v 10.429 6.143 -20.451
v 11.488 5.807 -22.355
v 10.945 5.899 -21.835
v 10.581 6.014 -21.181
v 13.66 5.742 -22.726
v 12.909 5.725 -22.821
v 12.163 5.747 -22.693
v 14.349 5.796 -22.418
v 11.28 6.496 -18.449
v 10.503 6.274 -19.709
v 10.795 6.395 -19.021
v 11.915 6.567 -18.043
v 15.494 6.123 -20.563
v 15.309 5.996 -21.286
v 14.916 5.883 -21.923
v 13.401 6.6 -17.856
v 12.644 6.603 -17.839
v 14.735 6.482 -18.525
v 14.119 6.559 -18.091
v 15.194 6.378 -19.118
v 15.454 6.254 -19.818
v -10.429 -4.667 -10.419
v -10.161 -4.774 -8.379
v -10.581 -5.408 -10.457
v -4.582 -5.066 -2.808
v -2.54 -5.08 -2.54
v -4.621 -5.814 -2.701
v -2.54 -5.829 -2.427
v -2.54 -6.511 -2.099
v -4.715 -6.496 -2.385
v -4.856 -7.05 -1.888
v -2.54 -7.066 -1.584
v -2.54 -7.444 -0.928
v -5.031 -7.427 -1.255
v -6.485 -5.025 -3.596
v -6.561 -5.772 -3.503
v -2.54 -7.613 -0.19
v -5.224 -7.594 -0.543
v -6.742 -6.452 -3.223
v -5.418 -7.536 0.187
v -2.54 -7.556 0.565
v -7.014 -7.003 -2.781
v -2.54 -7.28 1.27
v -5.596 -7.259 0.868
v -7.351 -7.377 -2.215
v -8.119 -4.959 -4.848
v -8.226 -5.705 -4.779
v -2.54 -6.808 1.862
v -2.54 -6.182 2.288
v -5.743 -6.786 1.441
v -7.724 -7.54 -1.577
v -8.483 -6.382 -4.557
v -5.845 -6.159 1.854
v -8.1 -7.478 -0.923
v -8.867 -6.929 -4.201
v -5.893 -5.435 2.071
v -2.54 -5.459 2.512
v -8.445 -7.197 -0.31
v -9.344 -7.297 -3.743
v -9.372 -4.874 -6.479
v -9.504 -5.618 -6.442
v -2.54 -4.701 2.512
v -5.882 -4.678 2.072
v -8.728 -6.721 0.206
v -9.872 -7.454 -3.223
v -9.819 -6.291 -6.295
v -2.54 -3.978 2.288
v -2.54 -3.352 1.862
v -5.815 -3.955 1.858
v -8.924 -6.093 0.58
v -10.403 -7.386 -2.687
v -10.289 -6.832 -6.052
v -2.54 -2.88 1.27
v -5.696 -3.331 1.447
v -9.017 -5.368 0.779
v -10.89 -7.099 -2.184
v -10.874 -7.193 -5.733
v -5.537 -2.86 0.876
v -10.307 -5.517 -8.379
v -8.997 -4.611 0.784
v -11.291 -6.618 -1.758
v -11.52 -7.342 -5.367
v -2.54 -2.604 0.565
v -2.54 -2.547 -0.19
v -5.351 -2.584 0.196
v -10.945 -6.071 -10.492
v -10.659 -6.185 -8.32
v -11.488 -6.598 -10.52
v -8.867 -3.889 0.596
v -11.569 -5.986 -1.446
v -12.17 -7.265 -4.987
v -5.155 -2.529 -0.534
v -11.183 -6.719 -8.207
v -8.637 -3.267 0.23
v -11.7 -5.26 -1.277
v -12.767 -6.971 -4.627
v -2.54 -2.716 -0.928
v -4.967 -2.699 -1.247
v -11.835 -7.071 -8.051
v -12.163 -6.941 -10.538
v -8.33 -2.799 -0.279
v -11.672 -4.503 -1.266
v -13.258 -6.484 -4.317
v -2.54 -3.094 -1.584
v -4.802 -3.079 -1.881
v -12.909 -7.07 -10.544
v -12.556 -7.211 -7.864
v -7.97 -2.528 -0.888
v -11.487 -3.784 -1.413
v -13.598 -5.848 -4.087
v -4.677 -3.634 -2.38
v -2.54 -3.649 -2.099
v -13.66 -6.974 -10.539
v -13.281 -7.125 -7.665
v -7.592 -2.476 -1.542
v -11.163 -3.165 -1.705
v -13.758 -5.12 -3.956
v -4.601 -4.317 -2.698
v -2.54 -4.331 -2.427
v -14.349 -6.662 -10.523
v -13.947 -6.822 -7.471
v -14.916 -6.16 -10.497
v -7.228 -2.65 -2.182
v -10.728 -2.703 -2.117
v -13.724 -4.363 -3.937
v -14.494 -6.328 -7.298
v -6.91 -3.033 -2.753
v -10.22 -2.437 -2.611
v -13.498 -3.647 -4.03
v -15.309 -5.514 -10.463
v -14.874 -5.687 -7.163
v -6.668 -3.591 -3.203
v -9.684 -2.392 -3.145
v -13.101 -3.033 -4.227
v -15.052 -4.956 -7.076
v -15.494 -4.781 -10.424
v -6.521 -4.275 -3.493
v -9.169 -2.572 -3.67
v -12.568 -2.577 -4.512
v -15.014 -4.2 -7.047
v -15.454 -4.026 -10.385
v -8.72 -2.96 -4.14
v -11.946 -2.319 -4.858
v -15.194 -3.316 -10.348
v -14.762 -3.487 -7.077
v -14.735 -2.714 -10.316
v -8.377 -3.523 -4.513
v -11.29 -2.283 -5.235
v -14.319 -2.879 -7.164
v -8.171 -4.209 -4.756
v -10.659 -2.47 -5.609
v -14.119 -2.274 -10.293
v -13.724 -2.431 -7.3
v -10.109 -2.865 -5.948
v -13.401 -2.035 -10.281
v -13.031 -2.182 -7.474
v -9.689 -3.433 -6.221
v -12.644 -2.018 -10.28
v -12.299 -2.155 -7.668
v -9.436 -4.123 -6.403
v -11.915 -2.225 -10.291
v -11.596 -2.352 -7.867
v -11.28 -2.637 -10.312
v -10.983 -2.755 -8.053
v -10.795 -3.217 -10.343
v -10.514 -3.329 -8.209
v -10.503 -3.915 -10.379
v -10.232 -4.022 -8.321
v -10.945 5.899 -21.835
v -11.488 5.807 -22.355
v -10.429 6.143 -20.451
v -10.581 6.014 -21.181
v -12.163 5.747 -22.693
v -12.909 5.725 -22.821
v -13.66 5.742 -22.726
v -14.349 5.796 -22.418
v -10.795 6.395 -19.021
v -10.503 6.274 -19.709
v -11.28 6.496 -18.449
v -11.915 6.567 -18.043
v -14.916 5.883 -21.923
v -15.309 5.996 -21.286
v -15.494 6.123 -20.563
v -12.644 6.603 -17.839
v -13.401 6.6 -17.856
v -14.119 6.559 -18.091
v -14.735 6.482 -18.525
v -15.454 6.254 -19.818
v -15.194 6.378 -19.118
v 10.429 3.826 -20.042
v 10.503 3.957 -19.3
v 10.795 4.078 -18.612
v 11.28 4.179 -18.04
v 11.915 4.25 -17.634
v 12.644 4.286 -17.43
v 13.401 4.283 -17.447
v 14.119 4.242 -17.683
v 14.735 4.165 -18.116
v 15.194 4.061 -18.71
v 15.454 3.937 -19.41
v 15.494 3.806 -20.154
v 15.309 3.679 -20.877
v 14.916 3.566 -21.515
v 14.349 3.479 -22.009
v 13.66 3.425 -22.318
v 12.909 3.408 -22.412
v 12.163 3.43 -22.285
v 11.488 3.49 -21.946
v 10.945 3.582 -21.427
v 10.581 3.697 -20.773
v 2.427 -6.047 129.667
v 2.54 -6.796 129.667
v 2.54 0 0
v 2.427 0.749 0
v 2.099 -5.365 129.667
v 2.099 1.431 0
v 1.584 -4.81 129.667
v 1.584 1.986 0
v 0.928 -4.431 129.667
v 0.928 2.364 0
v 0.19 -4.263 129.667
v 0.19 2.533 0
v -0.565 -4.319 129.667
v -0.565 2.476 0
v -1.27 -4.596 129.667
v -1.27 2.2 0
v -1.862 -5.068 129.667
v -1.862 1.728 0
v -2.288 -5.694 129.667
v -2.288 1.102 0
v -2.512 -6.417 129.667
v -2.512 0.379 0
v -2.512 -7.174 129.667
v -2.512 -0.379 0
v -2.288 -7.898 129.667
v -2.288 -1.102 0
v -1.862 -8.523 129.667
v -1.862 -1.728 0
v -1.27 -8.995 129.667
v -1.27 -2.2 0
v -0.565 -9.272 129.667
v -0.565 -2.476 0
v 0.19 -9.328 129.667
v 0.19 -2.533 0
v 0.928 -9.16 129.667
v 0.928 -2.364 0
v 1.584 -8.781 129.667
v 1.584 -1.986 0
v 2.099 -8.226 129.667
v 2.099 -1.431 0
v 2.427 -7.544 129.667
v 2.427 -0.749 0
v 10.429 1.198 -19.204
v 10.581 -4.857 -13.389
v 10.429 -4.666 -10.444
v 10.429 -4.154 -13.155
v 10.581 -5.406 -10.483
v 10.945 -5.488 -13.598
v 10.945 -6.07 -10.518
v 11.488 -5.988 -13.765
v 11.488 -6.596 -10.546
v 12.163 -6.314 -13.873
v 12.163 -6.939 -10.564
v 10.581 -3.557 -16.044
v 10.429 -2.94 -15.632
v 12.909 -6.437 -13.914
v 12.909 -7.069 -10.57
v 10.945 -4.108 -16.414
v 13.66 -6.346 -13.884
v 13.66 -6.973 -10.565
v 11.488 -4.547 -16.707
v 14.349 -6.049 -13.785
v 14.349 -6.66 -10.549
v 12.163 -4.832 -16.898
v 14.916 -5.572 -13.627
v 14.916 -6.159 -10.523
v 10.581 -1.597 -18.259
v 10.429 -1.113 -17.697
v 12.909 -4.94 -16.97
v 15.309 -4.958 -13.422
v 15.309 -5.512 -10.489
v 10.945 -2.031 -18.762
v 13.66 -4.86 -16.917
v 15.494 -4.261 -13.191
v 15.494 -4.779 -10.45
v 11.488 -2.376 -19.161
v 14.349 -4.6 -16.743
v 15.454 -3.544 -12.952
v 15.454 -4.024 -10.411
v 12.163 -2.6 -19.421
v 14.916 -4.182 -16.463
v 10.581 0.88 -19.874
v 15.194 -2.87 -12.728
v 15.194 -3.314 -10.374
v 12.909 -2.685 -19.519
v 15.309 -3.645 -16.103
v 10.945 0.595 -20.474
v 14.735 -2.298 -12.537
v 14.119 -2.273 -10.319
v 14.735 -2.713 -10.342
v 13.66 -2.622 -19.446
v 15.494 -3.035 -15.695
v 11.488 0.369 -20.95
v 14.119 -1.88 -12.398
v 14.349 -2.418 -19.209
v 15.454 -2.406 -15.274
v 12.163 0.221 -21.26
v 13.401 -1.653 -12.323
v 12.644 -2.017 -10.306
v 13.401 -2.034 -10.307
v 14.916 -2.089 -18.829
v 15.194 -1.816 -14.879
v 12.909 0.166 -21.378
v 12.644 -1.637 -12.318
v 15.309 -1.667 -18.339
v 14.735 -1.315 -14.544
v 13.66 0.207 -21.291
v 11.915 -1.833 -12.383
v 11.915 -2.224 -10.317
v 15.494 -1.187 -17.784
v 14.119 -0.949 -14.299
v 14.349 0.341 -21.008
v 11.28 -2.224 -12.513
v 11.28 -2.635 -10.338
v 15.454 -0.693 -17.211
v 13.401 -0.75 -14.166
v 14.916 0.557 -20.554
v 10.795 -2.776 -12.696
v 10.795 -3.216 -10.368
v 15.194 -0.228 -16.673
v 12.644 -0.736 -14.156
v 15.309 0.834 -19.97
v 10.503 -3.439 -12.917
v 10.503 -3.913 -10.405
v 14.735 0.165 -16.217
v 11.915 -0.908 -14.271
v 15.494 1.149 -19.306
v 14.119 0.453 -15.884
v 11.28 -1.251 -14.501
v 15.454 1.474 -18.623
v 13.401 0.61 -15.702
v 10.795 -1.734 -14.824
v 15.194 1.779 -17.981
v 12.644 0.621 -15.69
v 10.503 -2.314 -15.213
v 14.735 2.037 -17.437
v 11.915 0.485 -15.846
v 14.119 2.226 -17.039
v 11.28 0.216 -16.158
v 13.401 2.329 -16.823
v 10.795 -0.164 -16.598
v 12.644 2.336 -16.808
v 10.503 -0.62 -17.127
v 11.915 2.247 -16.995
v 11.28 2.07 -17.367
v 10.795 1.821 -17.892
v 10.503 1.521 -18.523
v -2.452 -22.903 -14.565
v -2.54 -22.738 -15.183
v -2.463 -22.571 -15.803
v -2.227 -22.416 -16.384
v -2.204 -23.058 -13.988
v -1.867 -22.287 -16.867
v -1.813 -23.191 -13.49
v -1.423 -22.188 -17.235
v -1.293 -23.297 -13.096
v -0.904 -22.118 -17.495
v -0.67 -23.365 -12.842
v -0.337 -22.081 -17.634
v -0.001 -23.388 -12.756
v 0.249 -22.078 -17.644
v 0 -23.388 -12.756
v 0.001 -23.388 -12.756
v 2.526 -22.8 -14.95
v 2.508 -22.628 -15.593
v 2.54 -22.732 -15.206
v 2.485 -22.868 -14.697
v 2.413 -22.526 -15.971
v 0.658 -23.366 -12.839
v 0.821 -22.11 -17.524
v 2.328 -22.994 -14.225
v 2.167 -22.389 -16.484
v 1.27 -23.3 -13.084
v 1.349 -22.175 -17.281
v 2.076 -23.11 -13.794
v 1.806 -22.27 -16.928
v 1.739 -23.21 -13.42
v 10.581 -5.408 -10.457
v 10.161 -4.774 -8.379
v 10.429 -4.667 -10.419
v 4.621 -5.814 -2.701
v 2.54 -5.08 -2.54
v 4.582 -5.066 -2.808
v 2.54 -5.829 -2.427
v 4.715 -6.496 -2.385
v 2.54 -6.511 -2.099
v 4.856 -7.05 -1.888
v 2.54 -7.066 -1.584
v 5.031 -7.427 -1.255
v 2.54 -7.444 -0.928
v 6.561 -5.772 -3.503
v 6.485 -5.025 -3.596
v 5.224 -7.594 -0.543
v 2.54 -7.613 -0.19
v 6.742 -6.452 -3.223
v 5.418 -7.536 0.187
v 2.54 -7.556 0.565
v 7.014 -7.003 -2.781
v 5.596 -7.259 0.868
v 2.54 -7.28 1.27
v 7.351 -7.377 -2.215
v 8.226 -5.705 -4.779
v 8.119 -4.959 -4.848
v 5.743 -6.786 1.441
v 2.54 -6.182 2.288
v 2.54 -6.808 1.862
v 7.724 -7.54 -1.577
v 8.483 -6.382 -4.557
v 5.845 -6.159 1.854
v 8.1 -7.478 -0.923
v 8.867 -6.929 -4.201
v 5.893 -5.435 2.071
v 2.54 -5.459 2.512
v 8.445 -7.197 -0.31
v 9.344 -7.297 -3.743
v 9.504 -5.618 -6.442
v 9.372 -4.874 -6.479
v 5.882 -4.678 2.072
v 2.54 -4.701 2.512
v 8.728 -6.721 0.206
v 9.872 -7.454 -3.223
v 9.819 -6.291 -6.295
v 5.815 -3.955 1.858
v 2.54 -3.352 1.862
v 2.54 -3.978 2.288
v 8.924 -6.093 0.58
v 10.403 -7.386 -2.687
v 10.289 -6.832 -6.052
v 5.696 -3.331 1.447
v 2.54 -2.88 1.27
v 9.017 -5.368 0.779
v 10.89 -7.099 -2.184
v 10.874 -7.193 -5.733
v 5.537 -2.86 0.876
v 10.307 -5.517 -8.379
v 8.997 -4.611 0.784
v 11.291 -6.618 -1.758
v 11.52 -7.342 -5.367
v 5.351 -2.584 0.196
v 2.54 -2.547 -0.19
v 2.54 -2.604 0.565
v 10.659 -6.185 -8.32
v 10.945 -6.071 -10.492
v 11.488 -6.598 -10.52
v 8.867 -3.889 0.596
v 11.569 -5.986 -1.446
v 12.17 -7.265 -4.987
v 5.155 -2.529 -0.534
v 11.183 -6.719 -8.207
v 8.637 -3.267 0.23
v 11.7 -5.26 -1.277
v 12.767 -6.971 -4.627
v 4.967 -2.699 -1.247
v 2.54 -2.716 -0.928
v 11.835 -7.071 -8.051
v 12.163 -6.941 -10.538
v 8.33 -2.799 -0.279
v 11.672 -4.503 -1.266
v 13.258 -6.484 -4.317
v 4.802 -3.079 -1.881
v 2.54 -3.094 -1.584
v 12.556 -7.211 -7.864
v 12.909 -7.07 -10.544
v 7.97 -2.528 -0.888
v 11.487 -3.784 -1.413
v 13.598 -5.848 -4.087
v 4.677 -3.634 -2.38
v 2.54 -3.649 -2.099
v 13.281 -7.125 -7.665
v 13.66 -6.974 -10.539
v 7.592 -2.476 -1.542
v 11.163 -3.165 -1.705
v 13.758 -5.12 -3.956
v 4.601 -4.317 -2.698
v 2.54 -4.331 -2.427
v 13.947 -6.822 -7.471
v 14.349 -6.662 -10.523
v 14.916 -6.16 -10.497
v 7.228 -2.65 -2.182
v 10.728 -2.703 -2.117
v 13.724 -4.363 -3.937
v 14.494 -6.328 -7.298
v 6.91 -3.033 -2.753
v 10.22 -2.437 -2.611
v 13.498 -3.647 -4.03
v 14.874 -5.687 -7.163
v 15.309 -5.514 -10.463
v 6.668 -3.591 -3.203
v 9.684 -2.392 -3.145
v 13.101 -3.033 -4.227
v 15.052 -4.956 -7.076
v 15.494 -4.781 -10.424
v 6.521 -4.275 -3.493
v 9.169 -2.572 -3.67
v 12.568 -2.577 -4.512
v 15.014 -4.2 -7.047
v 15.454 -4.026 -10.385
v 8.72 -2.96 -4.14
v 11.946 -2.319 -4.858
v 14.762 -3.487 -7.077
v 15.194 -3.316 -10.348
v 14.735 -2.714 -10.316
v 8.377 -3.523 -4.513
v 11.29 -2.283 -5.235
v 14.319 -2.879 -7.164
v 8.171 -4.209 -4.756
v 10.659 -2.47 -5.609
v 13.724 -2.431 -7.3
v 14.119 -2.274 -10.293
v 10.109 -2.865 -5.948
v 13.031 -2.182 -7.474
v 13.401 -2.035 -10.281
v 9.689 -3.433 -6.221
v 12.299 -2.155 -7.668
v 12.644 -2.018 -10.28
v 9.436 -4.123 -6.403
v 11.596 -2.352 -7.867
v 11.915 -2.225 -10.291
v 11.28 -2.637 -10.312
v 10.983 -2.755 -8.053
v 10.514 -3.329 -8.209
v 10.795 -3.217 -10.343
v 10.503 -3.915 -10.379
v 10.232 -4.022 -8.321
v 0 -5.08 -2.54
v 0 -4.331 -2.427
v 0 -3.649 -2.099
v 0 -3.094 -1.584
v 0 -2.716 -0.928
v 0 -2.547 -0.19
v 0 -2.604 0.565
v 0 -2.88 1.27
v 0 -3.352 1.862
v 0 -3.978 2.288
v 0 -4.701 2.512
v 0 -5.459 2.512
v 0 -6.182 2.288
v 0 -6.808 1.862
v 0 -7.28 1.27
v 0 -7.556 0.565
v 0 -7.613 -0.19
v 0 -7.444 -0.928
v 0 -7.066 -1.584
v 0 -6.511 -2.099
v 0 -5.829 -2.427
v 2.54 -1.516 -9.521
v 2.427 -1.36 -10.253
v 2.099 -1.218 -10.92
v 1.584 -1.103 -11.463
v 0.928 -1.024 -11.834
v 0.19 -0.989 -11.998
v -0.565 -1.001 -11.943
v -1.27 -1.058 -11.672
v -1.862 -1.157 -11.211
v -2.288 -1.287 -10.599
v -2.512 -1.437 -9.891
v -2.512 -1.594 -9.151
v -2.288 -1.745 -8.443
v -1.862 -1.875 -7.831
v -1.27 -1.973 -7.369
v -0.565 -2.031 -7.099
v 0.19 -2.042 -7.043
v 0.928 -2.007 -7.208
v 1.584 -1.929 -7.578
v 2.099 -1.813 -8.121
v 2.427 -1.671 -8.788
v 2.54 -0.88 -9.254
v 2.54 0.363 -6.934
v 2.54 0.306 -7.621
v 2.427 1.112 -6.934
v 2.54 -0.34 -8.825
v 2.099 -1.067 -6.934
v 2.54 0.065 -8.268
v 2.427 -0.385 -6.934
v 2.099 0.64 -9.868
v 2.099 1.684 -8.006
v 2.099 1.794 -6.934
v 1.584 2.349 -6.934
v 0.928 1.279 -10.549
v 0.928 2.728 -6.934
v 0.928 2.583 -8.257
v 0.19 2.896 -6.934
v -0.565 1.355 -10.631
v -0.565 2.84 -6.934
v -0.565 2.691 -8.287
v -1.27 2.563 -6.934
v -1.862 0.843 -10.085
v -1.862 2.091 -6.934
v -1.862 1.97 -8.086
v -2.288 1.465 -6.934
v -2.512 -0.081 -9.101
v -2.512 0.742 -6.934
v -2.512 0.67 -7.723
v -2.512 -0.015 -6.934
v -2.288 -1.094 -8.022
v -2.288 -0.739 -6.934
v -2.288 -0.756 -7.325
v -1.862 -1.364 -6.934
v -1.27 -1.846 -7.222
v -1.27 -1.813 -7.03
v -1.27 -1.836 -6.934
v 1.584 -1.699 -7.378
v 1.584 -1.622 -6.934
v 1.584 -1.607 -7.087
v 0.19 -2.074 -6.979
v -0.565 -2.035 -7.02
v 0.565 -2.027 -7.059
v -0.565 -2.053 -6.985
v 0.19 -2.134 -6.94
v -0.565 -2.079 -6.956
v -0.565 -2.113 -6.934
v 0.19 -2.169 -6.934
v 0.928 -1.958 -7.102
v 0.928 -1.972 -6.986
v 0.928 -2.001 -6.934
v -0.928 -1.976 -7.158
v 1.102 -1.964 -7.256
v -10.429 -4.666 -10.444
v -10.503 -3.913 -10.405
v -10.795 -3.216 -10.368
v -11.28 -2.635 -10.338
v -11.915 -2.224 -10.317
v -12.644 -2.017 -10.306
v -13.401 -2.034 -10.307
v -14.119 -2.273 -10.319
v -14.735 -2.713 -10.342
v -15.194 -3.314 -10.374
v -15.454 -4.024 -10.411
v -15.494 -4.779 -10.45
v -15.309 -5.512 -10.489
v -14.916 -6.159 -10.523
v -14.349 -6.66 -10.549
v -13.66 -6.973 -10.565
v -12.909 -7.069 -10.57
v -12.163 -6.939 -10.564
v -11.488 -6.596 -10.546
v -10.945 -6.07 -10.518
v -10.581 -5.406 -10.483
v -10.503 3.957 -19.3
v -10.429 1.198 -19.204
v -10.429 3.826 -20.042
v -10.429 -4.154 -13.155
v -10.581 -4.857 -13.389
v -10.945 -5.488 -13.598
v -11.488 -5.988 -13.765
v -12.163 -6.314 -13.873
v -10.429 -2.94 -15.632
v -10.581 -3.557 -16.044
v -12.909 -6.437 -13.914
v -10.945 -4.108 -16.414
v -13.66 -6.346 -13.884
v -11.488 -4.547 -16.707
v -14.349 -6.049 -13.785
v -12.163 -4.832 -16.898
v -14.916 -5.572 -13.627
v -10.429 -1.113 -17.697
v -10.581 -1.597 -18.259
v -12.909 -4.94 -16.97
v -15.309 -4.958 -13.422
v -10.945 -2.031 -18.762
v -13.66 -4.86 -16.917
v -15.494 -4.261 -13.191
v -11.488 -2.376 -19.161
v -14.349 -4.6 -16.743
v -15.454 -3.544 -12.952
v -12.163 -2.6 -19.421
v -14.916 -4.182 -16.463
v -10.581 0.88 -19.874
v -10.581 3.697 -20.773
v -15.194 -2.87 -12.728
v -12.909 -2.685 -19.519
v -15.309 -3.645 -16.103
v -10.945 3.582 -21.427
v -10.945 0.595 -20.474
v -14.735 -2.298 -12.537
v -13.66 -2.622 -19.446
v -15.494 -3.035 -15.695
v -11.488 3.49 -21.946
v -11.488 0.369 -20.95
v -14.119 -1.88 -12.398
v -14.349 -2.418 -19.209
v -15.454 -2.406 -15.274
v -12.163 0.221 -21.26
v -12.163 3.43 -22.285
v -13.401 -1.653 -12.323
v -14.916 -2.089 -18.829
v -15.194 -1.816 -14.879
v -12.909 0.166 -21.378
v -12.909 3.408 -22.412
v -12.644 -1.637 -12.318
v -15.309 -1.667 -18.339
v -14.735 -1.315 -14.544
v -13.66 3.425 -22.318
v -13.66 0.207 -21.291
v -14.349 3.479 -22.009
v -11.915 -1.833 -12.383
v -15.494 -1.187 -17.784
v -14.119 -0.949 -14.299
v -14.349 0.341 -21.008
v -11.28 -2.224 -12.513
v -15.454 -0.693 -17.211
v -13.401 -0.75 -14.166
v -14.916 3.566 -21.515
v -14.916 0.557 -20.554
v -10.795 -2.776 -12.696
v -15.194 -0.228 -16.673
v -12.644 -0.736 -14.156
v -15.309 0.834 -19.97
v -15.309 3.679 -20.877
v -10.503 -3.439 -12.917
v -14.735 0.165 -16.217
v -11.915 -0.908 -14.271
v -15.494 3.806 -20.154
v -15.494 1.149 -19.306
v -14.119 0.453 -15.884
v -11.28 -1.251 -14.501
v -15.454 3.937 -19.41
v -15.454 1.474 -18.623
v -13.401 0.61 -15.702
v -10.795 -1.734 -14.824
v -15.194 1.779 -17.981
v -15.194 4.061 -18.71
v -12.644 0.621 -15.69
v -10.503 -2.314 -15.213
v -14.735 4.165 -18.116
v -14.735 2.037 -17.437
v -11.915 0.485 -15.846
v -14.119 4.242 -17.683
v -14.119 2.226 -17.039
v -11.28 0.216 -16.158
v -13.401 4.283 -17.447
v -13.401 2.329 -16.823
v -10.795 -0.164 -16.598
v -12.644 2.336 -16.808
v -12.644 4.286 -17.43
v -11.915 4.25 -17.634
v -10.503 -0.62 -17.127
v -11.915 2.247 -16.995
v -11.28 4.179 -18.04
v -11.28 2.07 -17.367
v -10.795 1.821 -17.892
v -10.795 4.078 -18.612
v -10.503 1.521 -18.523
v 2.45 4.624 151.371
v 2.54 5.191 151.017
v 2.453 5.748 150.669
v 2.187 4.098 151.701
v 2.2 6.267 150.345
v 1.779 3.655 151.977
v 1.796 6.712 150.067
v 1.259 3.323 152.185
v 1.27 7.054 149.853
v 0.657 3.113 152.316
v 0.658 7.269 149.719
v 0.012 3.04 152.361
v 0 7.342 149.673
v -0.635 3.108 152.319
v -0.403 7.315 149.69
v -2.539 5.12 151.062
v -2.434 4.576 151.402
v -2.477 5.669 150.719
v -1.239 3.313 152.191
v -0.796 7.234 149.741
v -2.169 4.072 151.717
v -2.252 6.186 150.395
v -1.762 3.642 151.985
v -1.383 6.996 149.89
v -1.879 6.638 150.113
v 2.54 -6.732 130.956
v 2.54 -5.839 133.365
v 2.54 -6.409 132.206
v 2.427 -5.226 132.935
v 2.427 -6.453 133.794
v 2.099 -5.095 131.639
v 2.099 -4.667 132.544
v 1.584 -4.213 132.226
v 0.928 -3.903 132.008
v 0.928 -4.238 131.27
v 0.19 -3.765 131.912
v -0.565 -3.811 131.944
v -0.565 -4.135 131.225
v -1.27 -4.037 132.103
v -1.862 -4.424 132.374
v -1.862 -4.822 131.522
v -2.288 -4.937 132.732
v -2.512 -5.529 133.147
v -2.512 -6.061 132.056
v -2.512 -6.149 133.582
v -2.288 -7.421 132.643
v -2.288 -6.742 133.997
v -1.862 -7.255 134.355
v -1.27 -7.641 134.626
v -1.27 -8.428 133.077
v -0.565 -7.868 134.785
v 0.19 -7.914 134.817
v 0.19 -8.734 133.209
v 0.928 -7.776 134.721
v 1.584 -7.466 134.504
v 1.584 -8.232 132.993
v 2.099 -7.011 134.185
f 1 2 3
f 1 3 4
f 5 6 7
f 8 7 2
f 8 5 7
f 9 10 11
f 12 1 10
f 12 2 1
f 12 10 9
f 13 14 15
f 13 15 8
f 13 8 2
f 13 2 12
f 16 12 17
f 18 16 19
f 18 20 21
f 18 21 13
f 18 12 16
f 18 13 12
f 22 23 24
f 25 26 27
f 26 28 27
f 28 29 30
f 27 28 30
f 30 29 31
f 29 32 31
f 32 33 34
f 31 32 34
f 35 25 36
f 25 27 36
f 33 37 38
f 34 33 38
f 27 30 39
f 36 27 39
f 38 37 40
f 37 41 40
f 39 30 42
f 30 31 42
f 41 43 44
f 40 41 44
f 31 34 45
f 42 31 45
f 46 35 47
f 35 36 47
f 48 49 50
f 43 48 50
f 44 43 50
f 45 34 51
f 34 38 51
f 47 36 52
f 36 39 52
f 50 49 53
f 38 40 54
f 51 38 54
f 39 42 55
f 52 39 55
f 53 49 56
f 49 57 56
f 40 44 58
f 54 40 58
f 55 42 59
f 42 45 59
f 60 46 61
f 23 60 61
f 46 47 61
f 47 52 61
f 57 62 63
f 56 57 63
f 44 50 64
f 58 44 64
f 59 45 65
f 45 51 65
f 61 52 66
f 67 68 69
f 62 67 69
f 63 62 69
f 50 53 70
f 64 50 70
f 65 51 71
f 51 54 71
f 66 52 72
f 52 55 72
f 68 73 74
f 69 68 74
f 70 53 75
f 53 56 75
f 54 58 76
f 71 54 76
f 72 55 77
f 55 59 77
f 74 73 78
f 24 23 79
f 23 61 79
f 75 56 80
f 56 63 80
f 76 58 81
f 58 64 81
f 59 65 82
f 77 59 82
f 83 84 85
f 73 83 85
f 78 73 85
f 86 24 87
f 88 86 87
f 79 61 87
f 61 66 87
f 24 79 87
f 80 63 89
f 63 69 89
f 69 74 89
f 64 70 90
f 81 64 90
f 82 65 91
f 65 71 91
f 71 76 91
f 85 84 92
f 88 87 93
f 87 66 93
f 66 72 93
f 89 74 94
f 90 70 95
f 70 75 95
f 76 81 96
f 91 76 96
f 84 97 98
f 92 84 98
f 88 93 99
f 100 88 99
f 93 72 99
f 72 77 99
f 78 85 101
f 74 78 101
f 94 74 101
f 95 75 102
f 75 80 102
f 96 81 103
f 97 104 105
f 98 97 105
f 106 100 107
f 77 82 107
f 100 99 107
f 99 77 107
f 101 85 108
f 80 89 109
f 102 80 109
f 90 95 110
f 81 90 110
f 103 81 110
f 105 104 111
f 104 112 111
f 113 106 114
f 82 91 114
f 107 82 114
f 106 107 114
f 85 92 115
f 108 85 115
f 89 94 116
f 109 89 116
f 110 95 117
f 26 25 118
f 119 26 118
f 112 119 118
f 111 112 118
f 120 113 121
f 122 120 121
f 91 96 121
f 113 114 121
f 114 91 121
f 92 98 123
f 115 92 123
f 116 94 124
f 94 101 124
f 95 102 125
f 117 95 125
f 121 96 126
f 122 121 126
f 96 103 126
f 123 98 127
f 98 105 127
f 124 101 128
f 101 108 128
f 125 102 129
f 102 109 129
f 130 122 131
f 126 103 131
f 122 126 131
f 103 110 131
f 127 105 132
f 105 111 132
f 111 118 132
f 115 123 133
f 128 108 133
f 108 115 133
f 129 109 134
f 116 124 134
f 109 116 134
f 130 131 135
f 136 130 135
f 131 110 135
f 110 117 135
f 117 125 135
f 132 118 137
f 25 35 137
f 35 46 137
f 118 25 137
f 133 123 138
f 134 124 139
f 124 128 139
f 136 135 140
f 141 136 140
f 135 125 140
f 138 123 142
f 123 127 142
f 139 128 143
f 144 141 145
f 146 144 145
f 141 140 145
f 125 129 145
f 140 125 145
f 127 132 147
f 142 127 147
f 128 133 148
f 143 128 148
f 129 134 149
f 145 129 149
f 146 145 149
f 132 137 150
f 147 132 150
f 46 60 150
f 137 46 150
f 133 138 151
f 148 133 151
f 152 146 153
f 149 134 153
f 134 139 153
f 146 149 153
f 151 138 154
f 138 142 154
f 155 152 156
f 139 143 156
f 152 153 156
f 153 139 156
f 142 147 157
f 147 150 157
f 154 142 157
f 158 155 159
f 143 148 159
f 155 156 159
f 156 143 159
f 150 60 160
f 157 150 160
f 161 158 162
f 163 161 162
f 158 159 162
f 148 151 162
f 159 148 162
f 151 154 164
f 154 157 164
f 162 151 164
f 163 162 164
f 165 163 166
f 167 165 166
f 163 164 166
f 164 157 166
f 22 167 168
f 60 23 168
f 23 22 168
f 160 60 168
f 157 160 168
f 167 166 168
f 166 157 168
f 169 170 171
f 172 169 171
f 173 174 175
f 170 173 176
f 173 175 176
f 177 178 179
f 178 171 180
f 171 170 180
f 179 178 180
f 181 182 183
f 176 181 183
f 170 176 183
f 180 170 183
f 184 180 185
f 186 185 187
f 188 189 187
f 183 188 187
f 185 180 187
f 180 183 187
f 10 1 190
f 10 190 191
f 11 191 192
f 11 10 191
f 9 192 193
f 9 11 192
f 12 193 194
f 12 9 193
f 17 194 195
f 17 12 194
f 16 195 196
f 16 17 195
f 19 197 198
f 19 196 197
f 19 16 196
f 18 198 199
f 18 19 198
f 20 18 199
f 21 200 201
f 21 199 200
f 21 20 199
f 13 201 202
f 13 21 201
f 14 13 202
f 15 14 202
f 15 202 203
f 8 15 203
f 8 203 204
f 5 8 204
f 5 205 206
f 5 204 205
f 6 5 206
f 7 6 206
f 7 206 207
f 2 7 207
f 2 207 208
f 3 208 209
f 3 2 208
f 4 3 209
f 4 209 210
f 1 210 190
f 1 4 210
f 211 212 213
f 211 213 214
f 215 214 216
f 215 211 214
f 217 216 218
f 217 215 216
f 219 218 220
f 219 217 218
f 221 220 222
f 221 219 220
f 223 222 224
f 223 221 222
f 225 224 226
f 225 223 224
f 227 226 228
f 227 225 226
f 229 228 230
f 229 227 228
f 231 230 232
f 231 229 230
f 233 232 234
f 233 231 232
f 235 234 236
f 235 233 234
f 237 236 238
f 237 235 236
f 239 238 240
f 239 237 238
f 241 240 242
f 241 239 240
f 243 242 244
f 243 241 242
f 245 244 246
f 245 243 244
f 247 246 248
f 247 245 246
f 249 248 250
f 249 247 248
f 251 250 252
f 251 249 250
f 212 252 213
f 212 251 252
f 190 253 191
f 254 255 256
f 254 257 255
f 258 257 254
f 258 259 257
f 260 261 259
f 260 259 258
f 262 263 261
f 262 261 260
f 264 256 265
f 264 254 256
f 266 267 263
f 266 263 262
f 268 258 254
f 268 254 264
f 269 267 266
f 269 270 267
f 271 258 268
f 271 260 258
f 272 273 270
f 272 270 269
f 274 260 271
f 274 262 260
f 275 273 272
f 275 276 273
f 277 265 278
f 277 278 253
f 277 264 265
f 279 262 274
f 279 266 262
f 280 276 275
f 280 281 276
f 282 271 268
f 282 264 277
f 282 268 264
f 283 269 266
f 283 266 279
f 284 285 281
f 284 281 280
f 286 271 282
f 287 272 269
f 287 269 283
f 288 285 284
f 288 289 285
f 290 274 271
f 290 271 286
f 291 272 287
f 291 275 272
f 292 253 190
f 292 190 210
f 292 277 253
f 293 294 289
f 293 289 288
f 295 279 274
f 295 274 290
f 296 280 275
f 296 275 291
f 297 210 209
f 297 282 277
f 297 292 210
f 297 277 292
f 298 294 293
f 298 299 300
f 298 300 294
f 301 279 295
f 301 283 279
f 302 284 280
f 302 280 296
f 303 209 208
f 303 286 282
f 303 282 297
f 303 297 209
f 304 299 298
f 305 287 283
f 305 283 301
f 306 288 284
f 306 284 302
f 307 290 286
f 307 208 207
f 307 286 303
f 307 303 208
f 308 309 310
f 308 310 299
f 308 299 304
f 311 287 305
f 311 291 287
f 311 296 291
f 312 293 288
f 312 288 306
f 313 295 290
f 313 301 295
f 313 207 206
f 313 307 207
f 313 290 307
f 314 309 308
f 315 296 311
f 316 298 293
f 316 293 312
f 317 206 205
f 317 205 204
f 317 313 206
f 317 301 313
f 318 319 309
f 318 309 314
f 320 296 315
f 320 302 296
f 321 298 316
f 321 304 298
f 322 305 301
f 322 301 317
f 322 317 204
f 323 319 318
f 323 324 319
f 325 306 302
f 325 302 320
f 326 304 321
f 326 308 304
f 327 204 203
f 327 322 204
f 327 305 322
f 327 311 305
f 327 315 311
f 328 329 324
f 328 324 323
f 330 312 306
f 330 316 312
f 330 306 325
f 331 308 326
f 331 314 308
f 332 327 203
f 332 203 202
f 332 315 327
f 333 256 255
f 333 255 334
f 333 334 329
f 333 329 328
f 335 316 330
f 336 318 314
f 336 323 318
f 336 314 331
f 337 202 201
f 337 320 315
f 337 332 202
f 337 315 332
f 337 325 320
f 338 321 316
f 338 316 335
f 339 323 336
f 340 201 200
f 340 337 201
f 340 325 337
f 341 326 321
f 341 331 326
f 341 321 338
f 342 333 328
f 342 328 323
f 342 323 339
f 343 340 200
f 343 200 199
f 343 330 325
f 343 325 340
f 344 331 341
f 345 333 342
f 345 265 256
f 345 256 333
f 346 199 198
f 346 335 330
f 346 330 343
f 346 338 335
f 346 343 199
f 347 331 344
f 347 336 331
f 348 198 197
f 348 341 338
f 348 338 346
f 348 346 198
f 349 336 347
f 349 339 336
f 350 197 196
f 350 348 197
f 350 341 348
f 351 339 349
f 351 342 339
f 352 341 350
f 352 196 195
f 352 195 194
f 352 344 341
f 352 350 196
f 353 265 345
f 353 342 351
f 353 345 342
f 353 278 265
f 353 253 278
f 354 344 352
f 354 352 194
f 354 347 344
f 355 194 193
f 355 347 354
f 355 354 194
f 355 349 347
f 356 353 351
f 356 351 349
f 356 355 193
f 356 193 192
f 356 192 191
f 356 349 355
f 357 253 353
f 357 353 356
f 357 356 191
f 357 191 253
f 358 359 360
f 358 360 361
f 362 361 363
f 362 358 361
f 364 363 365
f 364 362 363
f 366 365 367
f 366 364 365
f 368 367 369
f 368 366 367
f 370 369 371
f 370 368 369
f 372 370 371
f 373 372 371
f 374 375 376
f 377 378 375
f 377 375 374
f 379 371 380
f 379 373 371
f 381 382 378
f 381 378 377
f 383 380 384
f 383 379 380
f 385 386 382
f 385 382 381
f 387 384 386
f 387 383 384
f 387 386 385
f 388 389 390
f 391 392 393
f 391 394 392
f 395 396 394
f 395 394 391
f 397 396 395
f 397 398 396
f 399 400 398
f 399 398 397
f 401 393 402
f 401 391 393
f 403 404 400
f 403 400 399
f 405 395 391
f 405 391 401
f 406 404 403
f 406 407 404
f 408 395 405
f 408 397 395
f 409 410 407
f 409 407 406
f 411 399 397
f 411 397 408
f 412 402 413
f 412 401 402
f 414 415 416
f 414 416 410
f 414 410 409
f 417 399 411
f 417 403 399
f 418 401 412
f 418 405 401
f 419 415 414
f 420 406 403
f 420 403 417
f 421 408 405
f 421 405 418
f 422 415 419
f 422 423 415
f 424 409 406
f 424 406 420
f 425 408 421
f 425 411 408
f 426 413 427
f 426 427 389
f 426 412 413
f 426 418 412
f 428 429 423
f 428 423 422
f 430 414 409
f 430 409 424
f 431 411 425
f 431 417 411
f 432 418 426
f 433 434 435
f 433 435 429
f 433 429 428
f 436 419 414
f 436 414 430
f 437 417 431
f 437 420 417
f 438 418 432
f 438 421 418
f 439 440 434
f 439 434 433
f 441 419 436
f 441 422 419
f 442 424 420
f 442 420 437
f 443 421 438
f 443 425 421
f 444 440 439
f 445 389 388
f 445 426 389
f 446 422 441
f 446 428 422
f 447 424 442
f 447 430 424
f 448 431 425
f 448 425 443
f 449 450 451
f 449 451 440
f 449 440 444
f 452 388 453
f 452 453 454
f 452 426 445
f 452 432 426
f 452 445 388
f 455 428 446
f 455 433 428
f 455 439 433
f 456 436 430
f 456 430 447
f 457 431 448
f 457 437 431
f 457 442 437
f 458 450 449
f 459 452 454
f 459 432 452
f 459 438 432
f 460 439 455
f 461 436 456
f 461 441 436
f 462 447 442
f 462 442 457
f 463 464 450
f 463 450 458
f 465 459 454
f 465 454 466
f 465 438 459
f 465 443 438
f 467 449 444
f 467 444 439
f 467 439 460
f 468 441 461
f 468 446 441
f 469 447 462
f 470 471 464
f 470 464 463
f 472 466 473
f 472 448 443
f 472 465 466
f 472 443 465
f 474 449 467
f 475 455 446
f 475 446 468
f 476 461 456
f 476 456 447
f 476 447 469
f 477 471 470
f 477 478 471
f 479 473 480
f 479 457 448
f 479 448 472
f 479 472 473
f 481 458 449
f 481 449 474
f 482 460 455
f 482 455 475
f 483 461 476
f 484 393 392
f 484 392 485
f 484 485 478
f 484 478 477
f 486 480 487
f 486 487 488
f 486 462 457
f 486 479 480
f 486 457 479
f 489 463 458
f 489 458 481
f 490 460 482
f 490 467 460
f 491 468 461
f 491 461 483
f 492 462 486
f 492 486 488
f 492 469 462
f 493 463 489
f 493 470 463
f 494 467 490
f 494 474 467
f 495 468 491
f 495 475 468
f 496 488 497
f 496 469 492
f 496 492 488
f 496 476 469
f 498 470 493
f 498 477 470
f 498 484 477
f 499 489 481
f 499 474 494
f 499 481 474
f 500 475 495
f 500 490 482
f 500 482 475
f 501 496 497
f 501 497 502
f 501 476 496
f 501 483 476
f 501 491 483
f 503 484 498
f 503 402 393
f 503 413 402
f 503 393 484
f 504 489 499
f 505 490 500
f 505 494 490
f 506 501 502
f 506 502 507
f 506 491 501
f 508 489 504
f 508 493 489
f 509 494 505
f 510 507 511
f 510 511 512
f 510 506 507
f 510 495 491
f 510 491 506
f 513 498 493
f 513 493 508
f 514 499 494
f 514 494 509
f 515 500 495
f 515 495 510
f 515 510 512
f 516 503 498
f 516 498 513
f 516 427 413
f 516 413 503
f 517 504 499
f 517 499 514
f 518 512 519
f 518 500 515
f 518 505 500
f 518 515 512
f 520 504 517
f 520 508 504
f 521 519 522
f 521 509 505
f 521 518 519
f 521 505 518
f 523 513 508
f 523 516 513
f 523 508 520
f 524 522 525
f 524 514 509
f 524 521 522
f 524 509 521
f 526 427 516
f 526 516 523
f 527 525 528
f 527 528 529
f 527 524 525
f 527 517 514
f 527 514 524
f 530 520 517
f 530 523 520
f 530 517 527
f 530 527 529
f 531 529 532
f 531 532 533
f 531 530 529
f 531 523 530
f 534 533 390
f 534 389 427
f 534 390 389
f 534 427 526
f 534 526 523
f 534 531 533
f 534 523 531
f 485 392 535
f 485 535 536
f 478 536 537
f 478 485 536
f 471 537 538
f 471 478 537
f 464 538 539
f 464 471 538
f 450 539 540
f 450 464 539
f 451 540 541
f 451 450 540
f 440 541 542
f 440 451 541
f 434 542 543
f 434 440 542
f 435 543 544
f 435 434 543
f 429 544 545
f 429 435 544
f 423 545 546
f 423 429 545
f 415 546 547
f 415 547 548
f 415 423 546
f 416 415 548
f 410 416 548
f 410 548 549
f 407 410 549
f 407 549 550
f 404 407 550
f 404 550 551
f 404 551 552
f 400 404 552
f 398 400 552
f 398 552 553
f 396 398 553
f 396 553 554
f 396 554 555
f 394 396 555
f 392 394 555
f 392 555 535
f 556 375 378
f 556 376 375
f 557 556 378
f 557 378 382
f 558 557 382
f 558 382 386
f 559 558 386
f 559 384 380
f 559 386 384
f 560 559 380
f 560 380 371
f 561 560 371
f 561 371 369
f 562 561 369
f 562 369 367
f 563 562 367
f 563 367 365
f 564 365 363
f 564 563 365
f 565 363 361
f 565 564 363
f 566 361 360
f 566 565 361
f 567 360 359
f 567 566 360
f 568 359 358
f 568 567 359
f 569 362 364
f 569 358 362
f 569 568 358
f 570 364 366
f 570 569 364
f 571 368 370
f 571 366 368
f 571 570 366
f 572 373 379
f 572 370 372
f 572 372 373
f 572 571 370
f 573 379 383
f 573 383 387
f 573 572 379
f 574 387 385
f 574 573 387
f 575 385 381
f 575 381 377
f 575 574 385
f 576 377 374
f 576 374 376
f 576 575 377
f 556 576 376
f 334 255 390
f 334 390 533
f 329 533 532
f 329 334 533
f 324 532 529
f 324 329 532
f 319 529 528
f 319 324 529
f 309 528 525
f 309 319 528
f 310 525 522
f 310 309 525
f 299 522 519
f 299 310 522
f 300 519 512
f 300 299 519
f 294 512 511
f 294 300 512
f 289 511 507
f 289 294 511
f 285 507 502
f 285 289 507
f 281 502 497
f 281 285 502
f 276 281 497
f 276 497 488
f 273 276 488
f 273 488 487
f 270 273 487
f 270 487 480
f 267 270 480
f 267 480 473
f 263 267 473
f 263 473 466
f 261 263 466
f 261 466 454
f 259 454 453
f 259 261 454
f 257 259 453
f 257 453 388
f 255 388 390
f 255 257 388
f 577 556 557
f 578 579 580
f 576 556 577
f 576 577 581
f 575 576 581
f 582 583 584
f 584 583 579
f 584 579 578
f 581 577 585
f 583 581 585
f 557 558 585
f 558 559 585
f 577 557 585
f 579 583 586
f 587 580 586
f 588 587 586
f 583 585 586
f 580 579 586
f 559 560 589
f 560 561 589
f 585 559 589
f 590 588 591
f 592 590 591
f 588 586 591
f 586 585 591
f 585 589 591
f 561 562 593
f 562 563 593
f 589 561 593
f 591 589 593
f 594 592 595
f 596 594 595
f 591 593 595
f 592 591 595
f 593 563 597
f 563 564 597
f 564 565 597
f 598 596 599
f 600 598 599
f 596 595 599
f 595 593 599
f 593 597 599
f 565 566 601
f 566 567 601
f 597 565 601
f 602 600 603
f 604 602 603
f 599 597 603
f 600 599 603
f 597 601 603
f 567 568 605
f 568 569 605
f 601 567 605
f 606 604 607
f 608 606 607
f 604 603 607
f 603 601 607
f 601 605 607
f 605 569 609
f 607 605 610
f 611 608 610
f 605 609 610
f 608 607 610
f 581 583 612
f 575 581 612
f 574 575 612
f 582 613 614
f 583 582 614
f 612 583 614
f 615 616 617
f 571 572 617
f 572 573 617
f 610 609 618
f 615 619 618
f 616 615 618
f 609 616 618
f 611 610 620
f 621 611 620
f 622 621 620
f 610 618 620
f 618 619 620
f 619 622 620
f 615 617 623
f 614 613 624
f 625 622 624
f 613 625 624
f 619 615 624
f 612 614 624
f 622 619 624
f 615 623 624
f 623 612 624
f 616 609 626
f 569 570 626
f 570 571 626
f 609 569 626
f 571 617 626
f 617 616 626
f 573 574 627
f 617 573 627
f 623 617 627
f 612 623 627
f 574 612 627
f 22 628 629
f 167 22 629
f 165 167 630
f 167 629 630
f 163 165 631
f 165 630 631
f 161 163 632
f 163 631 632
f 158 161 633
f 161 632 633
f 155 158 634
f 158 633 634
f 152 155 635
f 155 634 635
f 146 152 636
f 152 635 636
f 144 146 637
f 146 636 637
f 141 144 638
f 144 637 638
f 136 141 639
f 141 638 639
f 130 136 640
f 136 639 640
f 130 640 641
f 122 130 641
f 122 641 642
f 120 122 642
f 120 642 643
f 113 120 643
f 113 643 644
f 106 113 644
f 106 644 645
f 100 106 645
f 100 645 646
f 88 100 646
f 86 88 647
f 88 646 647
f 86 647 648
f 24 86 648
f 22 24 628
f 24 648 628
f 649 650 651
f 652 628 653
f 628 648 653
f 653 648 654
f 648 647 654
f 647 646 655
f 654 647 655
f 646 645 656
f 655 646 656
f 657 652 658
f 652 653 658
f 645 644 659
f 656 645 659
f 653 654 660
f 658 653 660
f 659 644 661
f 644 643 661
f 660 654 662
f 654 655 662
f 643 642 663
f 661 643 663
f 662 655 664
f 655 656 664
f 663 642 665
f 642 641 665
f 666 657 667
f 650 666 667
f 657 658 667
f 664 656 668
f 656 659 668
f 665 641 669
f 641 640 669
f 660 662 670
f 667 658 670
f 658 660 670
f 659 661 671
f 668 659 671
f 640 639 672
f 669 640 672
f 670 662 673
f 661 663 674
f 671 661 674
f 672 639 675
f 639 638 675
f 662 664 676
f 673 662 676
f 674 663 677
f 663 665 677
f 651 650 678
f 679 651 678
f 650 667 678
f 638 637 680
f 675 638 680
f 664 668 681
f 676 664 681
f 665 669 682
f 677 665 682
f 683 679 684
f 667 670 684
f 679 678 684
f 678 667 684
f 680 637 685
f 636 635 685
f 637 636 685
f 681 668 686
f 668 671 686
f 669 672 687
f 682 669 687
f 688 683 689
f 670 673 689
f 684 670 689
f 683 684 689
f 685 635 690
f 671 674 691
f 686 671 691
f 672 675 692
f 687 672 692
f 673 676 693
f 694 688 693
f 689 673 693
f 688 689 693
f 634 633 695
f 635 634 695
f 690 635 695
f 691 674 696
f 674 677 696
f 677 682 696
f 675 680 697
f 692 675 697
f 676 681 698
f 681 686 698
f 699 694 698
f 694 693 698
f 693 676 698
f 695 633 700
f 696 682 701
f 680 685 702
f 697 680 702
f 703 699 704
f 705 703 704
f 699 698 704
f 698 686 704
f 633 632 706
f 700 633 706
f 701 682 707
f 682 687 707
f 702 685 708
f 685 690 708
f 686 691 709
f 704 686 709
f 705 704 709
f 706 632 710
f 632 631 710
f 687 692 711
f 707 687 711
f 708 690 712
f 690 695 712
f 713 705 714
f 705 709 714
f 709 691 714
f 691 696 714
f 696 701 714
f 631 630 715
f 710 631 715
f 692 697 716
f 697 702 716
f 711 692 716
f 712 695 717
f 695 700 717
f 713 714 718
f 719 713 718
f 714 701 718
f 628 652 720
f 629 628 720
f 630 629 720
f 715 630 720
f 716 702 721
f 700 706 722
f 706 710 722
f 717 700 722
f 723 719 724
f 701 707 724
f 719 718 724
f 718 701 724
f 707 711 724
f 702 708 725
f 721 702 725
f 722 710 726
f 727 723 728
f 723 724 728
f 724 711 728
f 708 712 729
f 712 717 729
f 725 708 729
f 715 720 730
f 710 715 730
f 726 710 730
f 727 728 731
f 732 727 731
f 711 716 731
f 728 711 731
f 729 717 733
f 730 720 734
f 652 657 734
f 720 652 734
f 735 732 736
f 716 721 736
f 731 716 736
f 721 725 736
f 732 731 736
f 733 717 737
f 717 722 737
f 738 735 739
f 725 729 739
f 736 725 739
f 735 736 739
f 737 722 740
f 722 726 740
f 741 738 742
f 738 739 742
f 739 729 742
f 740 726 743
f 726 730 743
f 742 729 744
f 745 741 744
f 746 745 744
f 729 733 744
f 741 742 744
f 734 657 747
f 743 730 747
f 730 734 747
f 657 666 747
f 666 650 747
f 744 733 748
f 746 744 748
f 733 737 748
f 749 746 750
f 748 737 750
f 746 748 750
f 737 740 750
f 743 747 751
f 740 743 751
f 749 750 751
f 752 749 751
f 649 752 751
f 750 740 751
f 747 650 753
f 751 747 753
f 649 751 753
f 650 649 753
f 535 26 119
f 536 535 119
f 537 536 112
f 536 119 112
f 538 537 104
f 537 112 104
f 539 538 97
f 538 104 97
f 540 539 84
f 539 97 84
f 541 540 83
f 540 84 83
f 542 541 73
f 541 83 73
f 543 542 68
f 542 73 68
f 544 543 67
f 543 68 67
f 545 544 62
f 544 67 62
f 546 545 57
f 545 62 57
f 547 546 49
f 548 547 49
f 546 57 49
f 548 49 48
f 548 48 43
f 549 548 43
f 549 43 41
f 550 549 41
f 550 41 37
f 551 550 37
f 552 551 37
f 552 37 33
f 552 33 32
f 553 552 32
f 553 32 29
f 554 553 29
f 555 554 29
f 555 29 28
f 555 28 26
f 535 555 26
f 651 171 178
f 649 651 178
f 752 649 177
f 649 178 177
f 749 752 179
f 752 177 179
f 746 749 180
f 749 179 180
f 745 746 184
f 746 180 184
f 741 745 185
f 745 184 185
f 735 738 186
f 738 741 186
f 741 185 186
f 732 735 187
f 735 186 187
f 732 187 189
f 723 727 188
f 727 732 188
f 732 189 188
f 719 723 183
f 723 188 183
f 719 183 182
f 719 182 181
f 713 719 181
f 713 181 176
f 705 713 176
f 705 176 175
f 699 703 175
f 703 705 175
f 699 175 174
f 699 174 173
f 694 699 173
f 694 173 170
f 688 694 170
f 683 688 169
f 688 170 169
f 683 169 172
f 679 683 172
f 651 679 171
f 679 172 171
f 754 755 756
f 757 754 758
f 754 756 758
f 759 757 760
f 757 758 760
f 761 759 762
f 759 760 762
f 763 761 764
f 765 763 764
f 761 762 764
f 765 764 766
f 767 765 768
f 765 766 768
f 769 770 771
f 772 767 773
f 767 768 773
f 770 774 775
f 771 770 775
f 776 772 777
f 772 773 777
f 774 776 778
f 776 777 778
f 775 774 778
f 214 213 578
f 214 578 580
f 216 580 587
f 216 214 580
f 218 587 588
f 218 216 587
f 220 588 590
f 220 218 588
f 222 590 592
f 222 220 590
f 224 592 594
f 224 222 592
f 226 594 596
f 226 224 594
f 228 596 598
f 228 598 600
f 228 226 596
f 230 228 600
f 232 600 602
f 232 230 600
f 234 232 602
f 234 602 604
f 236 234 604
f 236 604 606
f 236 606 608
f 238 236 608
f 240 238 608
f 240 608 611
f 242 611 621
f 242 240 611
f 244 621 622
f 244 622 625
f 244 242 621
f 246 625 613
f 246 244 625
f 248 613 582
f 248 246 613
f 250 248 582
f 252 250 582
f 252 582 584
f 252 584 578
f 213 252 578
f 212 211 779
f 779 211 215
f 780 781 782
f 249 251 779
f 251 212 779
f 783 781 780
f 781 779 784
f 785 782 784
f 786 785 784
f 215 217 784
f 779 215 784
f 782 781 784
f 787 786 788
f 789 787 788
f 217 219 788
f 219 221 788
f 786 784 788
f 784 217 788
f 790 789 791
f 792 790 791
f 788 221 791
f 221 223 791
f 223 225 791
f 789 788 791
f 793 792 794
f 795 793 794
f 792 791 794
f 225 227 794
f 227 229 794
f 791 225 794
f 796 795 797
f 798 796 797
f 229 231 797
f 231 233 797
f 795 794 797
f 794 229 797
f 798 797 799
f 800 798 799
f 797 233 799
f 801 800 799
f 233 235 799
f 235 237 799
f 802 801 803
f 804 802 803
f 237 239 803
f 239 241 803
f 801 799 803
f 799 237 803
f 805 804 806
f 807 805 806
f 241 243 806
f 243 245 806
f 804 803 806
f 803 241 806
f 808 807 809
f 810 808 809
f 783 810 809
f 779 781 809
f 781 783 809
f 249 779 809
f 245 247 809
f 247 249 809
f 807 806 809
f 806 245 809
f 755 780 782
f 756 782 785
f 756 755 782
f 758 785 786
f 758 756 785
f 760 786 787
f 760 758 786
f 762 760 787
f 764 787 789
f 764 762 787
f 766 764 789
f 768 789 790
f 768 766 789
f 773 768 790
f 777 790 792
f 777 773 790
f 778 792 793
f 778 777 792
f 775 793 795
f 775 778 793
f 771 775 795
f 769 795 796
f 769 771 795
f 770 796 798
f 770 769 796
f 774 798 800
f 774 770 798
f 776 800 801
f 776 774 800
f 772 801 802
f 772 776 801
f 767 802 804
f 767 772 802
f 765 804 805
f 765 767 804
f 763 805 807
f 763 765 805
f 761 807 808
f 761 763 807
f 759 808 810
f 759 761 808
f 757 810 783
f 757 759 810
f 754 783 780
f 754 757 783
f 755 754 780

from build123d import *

# Parameters (mm, degrees)
SKETCH2_R = 2.54
SKETCH3_R = 2.54
SKETCH7_R = 2.54


with BuildPart() as part:
    # Sweep1: sweep along a path in Sketch1
    with BuildLine(Plane(origin=(0, 0, 0), x_dir=(0, 0, -1), z_dir=(1, 0, 0))) as sweep1_path:
        Line((0, 0), (-129.667234525, -6.795571807))
        ThreePointArc((-129.667234525, -6.795571807), (-131.589480873, -6.602011778), (-133.364555175, -5.839379672))
        Line((-133.364555175, -5.839379672), (-151.13, 5.261702322))
    # Sketch2 → Sweep1 (sweep)
    with BuildSketch(Plane.XY):
        Circle(SKETCH2_R)
    sweep(path=sweep1_path.line)

    # Sweep2: sweep along a path in Sketch4
    with BuildLine(Plane(origin=(0, 0, 0), x_dir=(0, 0, -1), z_dir=(1, 0, 0))) as sweep2_path:
        Line((15.24, -22.86), (9.520812242, -1.515700708))
        ThreePointArc((9.520812242, -1.515700708), (8.560335184, -0.118197916), (6.934427314, 0.363417936))
        Line((6.934427314, 0.363417936), (0, 0))
    # Sketch3 → Sweep2 (sweep)
    with BuildSketch(Plane.XY):
        Circle(SKETCH3_R)
    sweep(path=sweep2_path.line)

    # SurfaceCut1
    split(bisect_by=Plane(origin=(0, 5.19125839, 151.017266144), x_dir=(-1, 0, 0), z_dir=(0, -0.5299192642332059, -0.8480480961564255)), keep=Keep.TOP)

    # SurfaceCut2
    split(bisect_by=Plane(origin=(0, -22.731596264, -15.205594323), x_dir=(1, 0, 0), z_dir=(0, -0.965925826289068, -0.25881904510252185)), keep=Keep.BOTTOM)


with BuildPart() as body_2:
    # Sweep3: sweep along a curve in space
    with BuildLine() as sweep3_path:
        Line((0, -5.066085614, -0.265502297), (2.54, -5.066085614, -0.265502297))
        ThreePointArc((2.54, -5.066085614, -0.265502297), (9.724204897, -4.910344532, -3.237219176), (12.7, -4.534352299, -10.41157837))
        Line((12.7, -4.534352299, -10.41157837), (12.7, -4.532992073, -10.437533031))
        ThreePointArc((12.7, -4.532992073, -10.437533031), (12.7, -1.996306123, -16.638019406), (12.7, 3.848818515, -19.911446487))
        Line((12.7, 3.848818515, -19.911446487), (12.7, 6.165840628, -20.32))
    # Sketch7 → Sweep3 (sweep)
    with BuildSketch(Plane(origin=(0, 0, 0), x_dir=(0, 0, -1), z_dir=(1, 0, 0))):
        with Locations((0, -5.08)):
            Circle(SKETCH7_R)
    sweep(path=sweep3_path.line)

    # Mirror2: body 2 across plane


with BuildPart() as body_2_1:
    add(body_2.part)
    add(body_2.part.mirror(Plane(origin=(0, 0, 0), x_dir=(0, 0, 1), z_dir=(1, 0, 0))))


solid = Compound([part.part, body_2_1.part])
